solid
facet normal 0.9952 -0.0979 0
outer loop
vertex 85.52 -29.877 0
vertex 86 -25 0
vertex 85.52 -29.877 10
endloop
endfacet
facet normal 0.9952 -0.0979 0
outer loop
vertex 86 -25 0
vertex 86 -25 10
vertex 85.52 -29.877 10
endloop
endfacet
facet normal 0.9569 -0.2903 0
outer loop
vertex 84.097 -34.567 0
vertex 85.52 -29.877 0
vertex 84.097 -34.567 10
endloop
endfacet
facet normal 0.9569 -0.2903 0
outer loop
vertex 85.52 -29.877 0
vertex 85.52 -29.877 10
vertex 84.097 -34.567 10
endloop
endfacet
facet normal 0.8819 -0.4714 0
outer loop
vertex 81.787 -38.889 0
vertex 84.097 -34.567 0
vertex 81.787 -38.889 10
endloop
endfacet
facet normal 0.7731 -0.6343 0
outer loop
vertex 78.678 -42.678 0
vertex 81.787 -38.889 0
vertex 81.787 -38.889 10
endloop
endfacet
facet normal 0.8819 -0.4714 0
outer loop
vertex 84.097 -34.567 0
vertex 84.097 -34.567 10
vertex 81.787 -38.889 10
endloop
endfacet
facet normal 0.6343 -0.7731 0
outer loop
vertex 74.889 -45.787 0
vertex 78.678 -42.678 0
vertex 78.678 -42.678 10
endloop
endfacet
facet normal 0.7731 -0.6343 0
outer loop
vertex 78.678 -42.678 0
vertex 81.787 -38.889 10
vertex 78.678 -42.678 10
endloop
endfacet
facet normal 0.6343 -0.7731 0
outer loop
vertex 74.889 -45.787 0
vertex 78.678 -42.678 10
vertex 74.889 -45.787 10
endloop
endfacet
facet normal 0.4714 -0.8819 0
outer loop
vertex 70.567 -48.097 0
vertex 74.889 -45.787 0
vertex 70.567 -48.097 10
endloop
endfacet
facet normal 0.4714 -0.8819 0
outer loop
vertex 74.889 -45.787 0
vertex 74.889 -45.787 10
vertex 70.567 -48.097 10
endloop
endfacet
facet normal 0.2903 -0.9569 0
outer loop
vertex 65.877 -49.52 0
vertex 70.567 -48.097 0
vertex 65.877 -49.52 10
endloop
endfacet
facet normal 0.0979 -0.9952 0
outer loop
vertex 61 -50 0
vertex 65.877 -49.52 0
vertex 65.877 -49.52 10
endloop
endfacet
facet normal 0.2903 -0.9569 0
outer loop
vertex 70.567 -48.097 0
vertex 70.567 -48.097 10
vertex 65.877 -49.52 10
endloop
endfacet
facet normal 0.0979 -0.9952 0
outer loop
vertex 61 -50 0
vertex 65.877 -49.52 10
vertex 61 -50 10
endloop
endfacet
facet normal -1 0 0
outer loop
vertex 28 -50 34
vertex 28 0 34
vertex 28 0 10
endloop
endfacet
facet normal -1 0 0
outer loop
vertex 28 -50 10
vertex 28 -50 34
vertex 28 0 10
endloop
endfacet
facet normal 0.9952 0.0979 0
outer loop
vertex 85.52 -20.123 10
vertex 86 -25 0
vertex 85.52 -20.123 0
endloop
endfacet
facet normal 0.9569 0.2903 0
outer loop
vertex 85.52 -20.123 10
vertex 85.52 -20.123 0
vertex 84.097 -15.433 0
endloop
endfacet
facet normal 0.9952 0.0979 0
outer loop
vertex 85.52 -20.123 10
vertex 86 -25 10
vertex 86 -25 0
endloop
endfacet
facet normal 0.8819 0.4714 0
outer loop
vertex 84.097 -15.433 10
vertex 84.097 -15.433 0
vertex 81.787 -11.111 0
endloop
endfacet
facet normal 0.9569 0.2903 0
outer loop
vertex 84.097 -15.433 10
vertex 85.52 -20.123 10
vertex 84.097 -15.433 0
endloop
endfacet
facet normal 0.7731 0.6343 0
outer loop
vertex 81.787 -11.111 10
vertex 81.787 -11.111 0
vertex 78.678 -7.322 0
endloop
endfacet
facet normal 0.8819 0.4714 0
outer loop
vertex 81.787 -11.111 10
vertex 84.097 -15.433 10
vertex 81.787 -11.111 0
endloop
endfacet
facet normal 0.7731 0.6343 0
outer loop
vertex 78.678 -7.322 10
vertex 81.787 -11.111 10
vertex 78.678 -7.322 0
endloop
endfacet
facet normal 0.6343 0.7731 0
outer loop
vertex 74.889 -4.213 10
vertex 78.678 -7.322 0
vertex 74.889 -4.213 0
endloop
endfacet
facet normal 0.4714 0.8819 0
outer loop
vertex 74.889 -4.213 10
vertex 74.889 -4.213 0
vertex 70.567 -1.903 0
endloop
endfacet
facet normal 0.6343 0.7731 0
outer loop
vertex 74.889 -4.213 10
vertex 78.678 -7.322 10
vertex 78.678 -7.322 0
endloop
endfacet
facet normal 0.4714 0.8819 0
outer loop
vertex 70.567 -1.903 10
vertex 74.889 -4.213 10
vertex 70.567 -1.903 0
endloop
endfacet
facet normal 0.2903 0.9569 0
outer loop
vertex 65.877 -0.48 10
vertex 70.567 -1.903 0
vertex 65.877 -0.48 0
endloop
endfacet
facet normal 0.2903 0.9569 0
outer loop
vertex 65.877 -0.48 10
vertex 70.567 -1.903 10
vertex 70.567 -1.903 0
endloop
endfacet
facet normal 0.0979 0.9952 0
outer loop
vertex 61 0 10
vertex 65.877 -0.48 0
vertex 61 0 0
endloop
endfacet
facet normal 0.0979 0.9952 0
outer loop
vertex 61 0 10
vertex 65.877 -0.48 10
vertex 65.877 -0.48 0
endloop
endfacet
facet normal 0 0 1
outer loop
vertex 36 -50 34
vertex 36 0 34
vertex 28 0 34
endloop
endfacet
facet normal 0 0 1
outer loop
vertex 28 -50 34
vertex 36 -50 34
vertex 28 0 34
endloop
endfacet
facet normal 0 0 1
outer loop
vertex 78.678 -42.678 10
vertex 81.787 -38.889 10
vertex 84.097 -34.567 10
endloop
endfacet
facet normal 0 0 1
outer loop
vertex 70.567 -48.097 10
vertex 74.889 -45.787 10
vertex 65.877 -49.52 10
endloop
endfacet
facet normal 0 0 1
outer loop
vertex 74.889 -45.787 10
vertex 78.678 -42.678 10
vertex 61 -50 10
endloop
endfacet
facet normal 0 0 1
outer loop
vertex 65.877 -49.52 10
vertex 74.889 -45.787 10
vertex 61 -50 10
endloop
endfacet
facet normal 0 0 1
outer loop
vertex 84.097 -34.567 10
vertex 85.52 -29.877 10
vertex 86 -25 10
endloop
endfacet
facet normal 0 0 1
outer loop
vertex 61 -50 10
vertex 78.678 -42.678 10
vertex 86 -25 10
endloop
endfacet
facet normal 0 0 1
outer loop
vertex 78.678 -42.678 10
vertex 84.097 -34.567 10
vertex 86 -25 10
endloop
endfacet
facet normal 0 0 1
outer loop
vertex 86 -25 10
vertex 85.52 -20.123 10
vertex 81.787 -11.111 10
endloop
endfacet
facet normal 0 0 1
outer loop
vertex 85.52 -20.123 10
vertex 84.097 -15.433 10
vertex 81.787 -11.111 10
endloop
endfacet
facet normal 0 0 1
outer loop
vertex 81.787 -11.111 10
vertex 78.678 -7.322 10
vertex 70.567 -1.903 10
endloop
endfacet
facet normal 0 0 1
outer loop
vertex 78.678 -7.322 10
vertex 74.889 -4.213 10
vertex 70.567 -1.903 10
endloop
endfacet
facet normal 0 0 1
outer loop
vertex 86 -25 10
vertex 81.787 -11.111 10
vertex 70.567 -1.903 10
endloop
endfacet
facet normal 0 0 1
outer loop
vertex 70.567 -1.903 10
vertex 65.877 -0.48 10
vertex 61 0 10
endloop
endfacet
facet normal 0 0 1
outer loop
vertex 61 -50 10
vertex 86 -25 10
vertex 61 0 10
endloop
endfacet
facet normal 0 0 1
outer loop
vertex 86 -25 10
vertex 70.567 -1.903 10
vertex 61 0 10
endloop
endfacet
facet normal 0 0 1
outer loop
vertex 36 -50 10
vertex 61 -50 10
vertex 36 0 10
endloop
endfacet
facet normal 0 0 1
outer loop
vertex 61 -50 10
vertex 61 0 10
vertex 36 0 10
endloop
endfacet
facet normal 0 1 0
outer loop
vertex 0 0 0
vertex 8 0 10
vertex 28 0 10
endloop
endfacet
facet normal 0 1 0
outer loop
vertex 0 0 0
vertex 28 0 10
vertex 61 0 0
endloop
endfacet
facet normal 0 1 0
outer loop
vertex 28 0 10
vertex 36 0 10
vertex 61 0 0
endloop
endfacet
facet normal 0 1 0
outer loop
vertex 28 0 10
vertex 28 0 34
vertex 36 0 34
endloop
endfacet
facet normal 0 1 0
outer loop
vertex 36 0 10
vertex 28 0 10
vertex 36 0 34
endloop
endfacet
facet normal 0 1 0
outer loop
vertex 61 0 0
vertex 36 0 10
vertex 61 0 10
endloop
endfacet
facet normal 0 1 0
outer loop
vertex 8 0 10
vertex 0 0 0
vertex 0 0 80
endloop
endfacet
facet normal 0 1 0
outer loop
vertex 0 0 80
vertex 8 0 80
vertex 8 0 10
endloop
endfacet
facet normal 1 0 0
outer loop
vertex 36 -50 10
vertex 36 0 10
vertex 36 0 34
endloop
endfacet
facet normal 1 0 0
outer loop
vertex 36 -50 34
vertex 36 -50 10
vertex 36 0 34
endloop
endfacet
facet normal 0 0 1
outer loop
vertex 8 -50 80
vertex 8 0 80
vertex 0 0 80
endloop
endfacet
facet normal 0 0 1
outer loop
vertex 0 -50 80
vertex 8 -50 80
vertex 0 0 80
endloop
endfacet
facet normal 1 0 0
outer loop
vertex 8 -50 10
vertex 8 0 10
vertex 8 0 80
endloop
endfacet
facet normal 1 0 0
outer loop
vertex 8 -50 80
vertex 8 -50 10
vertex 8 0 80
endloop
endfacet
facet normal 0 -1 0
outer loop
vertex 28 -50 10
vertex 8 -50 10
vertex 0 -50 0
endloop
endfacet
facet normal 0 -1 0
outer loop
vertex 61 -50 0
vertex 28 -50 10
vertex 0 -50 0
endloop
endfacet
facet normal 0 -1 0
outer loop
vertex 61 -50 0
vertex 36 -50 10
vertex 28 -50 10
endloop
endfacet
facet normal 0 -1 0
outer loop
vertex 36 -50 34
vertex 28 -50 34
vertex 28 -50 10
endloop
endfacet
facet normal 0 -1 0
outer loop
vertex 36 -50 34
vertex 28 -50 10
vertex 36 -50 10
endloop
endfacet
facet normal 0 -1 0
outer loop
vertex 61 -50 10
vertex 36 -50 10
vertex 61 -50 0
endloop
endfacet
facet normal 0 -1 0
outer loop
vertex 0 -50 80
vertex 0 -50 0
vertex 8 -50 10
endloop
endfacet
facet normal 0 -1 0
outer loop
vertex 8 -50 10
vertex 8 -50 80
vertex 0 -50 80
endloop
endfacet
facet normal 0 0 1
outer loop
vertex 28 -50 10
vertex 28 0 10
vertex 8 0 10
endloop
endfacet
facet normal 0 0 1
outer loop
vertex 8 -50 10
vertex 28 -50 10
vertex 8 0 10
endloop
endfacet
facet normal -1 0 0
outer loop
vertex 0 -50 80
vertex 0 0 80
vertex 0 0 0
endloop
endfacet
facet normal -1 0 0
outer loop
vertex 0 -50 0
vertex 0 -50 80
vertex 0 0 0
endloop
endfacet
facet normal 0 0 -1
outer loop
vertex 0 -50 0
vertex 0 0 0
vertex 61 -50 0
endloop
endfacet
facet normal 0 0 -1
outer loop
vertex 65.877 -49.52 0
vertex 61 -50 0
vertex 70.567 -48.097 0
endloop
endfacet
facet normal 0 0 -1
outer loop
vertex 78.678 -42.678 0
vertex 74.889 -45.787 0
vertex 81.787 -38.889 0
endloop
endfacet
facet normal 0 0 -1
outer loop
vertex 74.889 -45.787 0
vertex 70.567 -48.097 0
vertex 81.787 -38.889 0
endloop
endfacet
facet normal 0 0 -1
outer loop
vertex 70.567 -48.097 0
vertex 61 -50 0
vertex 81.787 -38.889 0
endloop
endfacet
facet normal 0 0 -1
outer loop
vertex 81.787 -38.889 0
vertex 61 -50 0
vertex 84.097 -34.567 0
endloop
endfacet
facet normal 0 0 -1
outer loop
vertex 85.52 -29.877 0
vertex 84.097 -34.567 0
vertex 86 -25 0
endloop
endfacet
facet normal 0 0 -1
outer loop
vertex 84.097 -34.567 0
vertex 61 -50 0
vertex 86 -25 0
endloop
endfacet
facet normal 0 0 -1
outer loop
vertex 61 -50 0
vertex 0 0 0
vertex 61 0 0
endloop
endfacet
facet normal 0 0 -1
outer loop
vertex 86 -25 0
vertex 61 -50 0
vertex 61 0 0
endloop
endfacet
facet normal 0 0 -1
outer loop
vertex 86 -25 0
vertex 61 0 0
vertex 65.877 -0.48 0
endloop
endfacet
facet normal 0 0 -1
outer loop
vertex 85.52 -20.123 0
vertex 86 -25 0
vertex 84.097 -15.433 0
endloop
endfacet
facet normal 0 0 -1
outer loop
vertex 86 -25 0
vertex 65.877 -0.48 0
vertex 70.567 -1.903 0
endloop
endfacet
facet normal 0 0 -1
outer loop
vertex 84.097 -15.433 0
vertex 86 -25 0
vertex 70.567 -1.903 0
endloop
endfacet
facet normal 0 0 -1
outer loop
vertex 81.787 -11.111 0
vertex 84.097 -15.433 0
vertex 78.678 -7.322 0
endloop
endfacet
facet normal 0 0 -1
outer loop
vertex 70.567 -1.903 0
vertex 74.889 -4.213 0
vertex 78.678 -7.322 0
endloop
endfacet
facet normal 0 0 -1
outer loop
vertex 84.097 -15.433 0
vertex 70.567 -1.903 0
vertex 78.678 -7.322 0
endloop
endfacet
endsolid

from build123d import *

# Parameters (mm, degrees)
F2_DEPTH = 50
F3_R     = 25
F4_R     = 24.99999


# Not quite as in the source:
# - a fillet or chamfer is up to 0.001 mm smaller than in the source, because OpenCascade refuses the exact size


with BuildPart() as f2:
    # F1 (on face) → F2 (new body)
    with BuildSketch(Plane.XZ):
        Polygon((8, 80), (0, 80), (0, 0), (86, 0), (86, 10), (61, 10), (36, 10), (36, 34), (28, 34), (28, 10), (8, 10), align=None)
    extrude(amount=F2_DEPTH)

    # F3
    f3_edges = [f2.edges().sort_by_distance(p)[0] for p in [
        (86, -50, 5),
    ]]
    fillet(f3_edges, radius=F3_R)

    # F4 (radius 25 in the source; OpenCascade refuses exactly that, so slightly less here)
    f4_edges = [f2.edges().sort_by_distance(p)[0] for p in [
        (86, 0, 5),
    ]]
    fillet(f4_edges, radius=F4_R)


solid = f2.part
